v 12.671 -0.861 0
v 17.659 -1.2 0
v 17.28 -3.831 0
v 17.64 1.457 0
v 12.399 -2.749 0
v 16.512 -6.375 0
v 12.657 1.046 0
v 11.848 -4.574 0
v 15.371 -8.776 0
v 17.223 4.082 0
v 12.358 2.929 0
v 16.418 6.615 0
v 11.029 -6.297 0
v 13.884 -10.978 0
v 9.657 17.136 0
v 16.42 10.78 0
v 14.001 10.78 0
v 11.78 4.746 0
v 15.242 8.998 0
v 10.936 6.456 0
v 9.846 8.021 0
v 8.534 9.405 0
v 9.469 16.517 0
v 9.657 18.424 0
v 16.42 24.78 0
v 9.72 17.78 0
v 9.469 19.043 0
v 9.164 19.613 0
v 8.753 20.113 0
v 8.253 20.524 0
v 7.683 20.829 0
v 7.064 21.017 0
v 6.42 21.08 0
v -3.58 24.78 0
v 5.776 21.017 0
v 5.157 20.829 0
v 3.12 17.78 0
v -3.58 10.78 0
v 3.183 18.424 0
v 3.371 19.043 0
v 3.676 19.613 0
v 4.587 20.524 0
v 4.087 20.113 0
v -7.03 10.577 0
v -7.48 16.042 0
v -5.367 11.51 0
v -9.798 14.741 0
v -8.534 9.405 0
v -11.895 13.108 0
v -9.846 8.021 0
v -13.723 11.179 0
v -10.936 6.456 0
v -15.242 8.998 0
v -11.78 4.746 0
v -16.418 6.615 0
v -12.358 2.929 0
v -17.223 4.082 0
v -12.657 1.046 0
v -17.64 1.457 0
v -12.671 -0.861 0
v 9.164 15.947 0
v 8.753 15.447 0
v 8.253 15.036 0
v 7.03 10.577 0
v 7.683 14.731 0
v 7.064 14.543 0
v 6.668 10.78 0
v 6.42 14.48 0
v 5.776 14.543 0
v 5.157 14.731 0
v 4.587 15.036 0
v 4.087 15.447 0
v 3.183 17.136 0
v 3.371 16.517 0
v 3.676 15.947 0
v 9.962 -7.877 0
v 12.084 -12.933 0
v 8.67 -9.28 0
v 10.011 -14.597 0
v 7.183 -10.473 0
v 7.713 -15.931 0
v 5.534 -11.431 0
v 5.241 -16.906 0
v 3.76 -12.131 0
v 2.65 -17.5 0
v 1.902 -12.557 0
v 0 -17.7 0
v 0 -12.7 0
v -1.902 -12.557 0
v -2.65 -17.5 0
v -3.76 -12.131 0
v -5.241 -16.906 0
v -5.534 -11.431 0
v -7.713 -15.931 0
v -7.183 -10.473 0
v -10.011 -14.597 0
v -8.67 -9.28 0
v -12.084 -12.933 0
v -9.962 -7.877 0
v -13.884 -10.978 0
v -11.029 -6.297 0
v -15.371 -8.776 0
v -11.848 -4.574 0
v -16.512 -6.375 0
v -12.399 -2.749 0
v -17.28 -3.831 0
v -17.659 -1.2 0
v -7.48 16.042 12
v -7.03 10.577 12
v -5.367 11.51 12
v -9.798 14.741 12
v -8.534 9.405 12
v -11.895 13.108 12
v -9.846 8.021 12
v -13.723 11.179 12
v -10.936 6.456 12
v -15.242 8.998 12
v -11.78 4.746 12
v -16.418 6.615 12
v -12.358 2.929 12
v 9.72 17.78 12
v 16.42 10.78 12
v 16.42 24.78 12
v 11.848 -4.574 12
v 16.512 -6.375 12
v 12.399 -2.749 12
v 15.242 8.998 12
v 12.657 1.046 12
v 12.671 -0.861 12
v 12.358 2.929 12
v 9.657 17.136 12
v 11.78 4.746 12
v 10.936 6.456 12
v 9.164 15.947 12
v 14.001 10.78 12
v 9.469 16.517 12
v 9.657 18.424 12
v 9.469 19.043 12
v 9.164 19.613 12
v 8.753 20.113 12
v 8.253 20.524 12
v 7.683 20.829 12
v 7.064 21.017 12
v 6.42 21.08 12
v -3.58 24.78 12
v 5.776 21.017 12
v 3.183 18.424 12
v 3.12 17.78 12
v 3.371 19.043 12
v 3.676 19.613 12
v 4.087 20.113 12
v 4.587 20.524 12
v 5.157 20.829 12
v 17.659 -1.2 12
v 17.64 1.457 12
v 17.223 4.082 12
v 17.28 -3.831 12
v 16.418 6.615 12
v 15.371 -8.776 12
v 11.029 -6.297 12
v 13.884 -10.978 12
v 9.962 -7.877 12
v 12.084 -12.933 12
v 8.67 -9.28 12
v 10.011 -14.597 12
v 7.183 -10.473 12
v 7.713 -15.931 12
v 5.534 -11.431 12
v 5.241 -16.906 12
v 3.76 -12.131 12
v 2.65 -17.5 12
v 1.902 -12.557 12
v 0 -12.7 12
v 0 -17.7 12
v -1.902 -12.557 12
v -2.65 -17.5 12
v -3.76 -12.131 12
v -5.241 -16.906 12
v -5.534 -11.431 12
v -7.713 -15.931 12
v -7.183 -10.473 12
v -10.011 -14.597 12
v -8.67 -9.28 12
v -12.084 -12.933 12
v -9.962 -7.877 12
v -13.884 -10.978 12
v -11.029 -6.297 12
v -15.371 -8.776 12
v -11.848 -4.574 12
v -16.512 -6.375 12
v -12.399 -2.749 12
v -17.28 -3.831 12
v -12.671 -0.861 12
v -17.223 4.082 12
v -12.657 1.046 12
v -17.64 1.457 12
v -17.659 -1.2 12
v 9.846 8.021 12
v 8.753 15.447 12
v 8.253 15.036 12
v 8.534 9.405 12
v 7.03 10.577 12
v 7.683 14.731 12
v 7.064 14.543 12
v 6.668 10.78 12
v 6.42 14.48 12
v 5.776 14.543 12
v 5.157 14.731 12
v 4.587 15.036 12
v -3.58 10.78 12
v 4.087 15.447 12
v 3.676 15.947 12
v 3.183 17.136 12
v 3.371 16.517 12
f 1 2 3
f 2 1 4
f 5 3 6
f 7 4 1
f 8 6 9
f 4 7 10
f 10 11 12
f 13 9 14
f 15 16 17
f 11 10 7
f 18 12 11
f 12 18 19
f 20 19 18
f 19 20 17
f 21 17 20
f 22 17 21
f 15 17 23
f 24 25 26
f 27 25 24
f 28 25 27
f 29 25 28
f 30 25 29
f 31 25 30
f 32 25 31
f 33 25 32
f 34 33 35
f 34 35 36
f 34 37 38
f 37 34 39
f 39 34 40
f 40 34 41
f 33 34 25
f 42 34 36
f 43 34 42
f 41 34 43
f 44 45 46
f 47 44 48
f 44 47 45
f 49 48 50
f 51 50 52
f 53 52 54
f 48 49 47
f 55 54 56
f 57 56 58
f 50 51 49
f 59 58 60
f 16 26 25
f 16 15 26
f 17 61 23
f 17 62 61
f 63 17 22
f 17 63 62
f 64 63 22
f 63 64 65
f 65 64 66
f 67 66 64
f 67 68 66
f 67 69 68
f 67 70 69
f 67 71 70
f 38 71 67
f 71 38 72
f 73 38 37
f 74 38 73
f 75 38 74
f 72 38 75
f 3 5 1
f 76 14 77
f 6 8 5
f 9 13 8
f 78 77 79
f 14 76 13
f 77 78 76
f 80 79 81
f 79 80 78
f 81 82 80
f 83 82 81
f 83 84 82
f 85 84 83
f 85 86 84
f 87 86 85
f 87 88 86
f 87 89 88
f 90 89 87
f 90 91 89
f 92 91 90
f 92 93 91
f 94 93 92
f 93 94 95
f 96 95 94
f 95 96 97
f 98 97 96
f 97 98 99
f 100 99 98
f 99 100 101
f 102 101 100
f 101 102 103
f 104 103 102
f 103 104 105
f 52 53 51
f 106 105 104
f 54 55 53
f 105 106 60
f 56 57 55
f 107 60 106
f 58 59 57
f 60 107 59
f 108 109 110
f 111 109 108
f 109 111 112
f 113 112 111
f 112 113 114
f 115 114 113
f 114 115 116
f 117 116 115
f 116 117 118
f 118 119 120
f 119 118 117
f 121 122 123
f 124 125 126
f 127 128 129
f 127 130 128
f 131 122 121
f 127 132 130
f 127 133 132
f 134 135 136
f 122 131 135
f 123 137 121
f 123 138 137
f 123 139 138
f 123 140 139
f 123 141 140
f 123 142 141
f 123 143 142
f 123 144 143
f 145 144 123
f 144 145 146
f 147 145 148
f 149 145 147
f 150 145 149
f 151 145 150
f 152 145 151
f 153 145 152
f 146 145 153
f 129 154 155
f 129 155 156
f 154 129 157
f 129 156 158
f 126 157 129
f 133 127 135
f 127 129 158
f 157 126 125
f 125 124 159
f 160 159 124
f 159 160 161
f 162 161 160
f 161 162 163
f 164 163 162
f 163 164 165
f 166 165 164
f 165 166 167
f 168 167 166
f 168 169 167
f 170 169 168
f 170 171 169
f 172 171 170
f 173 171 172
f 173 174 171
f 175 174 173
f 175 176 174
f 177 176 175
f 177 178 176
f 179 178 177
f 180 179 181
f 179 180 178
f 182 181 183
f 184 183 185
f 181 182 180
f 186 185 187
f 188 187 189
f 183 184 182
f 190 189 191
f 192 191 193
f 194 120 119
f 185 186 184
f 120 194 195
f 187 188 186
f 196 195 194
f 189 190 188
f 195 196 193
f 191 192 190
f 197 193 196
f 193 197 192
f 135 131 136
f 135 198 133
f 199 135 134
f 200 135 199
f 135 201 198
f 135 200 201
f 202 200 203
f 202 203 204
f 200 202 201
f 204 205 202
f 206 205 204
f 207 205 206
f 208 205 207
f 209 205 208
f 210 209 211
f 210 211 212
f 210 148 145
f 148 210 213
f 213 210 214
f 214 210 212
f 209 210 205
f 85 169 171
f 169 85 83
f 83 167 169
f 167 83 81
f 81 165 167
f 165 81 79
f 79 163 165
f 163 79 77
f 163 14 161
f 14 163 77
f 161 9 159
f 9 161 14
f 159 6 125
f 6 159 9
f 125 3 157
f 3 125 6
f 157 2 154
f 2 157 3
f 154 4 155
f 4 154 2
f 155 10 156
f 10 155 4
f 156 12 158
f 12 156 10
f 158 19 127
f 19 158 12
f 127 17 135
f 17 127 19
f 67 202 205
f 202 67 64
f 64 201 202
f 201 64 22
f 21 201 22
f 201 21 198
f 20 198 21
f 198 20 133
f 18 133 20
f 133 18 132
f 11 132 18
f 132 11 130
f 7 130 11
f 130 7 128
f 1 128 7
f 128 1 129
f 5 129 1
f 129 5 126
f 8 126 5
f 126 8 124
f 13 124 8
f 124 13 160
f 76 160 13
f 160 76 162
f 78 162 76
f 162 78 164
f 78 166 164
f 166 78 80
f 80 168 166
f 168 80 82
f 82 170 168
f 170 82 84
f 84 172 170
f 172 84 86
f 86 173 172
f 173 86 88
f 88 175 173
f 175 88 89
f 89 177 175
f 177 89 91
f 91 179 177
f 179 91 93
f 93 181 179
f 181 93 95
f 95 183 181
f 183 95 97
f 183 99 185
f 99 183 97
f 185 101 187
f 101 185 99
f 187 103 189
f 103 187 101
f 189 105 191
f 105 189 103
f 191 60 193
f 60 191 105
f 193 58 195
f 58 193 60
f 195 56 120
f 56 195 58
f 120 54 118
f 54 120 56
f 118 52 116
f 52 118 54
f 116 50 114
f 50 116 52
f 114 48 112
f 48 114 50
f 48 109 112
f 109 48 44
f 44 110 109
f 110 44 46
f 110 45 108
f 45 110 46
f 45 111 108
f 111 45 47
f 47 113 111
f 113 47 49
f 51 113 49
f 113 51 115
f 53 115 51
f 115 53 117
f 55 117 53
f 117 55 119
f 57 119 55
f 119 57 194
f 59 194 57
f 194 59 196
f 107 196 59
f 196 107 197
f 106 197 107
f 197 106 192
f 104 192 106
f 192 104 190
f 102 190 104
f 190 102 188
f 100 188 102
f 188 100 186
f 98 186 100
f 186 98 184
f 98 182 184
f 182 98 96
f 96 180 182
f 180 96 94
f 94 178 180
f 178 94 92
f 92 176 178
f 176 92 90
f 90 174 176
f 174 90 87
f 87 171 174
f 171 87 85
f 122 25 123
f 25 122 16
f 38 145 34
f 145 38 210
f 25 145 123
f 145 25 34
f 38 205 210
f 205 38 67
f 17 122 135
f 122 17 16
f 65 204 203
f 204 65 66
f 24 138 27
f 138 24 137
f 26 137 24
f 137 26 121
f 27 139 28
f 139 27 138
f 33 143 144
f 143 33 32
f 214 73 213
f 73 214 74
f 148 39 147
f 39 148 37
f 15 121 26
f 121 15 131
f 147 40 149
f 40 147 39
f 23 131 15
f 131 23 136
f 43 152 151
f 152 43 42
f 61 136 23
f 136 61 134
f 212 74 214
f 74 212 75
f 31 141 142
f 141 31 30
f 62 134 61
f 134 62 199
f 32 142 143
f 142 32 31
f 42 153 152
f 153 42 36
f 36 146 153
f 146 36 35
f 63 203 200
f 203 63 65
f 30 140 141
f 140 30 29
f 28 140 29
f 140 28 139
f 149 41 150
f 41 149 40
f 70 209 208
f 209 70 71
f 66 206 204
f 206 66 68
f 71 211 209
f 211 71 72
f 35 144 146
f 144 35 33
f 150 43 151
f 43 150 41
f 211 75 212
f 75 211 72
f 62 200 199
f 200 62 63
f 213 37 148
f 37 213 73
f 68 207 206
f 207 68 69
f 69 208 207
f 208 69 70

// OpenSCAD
$fn = 32;

// ----------------------------------------------------------------------
// Pipe clamp: 35.4 mm ring, 5 mm wall, 12 mm wide
// ----------------------------------------------------------------------

// --- parameters (mm) ---
outer_r = 17.7;           // clamp outside radius
inner_r = 12.7;           // pipe bore radius
band = 5;                 // band thickness
clamp_w = 12;             // clamp width
opening = 50;             // opening angle between the ends
lug_w = 20;               // lug width
lug_len = 14;             // lug length
bolt_d = 6.6;             // bolt hole

clamp_profile = [[-7.48, 16.042], [-9.798, 14.741], [-11.895, 13.108], [-13.723, 11.179], [-15.242, 8.998], [-16.418, 6.615], [-17.223, 4.082], [-17.64, 1.457], [-17.659, -1.2], [-17.28, -3.831], [-16.512, -6.375], [-15.371, -8.776], [-13.884, -10.978], [-12.084, -12.933], [-10.011, -14.597], [-7.713, -15.931], [-5.241, -16.906], [-2.65, -17.5], [0, -17.7], [2.65, -17.5], [5.241, -16.906], [7.713, -15.931], [10.011, -14.597], [12.084, -12.933], [13.884, -10.978], [15.371, -8.776], [16.512, -6.375], [17.28, -3.831], [17.659, -1.2], [17.64, 1.457], [17.223, 4.082], [16.418, 6.615], [15.242, 8.998], [13.723, 11.179], [11.895, 13.108], [9.798, 14.741], [7.48, 16.042], [5.367, 11.51], [7.03, 10.577], [8.534, 9.405], [9.846, 8.021], [10.936, 6.456], [11.78, 4.746], [12.358, 2.929], [12.657, 1.046], [12.671, -0.861], [12.399, -2.749], [11.848, -4.574], [11.029, -6.297], [9.962, -7.877], [8.67, -9.28], [7.183, -10.473], [5.534, -11.431], [3.76, -12.131], [1.902, -12.557], [0, -12.7], [-1.902, -12.557], [-3.76, -12.131], [-5.534, -11.431], [-7.183, -10.473], [-8.67, -9.28], [-9.962, -7.877], [-11.029, -6.297], [-11.848, -4.574], [-12.399, -2.749], [-12.671, -0.861], [-12.657, 1.046], [-12.358, 2.929], [-11.78, 4.746], [-10.936, 6.456], [-9.846, 8.021], [-8.534, 9.405], [-7.03, 10.577], [-5.367, 11.51]];

difference() {
  union() {
    linear_extrude(height = clamp_w) polygon(clamp_profile);
    /* bolt lug on the other end */
    translate([-3.58, 10.78, 0]) cube([lug_w, 14, clamp_w]);
  }
  translate([6.42, 17.78, -2.5]) cylinder(h = clamp_w + 5, d = bolt_d);
}
